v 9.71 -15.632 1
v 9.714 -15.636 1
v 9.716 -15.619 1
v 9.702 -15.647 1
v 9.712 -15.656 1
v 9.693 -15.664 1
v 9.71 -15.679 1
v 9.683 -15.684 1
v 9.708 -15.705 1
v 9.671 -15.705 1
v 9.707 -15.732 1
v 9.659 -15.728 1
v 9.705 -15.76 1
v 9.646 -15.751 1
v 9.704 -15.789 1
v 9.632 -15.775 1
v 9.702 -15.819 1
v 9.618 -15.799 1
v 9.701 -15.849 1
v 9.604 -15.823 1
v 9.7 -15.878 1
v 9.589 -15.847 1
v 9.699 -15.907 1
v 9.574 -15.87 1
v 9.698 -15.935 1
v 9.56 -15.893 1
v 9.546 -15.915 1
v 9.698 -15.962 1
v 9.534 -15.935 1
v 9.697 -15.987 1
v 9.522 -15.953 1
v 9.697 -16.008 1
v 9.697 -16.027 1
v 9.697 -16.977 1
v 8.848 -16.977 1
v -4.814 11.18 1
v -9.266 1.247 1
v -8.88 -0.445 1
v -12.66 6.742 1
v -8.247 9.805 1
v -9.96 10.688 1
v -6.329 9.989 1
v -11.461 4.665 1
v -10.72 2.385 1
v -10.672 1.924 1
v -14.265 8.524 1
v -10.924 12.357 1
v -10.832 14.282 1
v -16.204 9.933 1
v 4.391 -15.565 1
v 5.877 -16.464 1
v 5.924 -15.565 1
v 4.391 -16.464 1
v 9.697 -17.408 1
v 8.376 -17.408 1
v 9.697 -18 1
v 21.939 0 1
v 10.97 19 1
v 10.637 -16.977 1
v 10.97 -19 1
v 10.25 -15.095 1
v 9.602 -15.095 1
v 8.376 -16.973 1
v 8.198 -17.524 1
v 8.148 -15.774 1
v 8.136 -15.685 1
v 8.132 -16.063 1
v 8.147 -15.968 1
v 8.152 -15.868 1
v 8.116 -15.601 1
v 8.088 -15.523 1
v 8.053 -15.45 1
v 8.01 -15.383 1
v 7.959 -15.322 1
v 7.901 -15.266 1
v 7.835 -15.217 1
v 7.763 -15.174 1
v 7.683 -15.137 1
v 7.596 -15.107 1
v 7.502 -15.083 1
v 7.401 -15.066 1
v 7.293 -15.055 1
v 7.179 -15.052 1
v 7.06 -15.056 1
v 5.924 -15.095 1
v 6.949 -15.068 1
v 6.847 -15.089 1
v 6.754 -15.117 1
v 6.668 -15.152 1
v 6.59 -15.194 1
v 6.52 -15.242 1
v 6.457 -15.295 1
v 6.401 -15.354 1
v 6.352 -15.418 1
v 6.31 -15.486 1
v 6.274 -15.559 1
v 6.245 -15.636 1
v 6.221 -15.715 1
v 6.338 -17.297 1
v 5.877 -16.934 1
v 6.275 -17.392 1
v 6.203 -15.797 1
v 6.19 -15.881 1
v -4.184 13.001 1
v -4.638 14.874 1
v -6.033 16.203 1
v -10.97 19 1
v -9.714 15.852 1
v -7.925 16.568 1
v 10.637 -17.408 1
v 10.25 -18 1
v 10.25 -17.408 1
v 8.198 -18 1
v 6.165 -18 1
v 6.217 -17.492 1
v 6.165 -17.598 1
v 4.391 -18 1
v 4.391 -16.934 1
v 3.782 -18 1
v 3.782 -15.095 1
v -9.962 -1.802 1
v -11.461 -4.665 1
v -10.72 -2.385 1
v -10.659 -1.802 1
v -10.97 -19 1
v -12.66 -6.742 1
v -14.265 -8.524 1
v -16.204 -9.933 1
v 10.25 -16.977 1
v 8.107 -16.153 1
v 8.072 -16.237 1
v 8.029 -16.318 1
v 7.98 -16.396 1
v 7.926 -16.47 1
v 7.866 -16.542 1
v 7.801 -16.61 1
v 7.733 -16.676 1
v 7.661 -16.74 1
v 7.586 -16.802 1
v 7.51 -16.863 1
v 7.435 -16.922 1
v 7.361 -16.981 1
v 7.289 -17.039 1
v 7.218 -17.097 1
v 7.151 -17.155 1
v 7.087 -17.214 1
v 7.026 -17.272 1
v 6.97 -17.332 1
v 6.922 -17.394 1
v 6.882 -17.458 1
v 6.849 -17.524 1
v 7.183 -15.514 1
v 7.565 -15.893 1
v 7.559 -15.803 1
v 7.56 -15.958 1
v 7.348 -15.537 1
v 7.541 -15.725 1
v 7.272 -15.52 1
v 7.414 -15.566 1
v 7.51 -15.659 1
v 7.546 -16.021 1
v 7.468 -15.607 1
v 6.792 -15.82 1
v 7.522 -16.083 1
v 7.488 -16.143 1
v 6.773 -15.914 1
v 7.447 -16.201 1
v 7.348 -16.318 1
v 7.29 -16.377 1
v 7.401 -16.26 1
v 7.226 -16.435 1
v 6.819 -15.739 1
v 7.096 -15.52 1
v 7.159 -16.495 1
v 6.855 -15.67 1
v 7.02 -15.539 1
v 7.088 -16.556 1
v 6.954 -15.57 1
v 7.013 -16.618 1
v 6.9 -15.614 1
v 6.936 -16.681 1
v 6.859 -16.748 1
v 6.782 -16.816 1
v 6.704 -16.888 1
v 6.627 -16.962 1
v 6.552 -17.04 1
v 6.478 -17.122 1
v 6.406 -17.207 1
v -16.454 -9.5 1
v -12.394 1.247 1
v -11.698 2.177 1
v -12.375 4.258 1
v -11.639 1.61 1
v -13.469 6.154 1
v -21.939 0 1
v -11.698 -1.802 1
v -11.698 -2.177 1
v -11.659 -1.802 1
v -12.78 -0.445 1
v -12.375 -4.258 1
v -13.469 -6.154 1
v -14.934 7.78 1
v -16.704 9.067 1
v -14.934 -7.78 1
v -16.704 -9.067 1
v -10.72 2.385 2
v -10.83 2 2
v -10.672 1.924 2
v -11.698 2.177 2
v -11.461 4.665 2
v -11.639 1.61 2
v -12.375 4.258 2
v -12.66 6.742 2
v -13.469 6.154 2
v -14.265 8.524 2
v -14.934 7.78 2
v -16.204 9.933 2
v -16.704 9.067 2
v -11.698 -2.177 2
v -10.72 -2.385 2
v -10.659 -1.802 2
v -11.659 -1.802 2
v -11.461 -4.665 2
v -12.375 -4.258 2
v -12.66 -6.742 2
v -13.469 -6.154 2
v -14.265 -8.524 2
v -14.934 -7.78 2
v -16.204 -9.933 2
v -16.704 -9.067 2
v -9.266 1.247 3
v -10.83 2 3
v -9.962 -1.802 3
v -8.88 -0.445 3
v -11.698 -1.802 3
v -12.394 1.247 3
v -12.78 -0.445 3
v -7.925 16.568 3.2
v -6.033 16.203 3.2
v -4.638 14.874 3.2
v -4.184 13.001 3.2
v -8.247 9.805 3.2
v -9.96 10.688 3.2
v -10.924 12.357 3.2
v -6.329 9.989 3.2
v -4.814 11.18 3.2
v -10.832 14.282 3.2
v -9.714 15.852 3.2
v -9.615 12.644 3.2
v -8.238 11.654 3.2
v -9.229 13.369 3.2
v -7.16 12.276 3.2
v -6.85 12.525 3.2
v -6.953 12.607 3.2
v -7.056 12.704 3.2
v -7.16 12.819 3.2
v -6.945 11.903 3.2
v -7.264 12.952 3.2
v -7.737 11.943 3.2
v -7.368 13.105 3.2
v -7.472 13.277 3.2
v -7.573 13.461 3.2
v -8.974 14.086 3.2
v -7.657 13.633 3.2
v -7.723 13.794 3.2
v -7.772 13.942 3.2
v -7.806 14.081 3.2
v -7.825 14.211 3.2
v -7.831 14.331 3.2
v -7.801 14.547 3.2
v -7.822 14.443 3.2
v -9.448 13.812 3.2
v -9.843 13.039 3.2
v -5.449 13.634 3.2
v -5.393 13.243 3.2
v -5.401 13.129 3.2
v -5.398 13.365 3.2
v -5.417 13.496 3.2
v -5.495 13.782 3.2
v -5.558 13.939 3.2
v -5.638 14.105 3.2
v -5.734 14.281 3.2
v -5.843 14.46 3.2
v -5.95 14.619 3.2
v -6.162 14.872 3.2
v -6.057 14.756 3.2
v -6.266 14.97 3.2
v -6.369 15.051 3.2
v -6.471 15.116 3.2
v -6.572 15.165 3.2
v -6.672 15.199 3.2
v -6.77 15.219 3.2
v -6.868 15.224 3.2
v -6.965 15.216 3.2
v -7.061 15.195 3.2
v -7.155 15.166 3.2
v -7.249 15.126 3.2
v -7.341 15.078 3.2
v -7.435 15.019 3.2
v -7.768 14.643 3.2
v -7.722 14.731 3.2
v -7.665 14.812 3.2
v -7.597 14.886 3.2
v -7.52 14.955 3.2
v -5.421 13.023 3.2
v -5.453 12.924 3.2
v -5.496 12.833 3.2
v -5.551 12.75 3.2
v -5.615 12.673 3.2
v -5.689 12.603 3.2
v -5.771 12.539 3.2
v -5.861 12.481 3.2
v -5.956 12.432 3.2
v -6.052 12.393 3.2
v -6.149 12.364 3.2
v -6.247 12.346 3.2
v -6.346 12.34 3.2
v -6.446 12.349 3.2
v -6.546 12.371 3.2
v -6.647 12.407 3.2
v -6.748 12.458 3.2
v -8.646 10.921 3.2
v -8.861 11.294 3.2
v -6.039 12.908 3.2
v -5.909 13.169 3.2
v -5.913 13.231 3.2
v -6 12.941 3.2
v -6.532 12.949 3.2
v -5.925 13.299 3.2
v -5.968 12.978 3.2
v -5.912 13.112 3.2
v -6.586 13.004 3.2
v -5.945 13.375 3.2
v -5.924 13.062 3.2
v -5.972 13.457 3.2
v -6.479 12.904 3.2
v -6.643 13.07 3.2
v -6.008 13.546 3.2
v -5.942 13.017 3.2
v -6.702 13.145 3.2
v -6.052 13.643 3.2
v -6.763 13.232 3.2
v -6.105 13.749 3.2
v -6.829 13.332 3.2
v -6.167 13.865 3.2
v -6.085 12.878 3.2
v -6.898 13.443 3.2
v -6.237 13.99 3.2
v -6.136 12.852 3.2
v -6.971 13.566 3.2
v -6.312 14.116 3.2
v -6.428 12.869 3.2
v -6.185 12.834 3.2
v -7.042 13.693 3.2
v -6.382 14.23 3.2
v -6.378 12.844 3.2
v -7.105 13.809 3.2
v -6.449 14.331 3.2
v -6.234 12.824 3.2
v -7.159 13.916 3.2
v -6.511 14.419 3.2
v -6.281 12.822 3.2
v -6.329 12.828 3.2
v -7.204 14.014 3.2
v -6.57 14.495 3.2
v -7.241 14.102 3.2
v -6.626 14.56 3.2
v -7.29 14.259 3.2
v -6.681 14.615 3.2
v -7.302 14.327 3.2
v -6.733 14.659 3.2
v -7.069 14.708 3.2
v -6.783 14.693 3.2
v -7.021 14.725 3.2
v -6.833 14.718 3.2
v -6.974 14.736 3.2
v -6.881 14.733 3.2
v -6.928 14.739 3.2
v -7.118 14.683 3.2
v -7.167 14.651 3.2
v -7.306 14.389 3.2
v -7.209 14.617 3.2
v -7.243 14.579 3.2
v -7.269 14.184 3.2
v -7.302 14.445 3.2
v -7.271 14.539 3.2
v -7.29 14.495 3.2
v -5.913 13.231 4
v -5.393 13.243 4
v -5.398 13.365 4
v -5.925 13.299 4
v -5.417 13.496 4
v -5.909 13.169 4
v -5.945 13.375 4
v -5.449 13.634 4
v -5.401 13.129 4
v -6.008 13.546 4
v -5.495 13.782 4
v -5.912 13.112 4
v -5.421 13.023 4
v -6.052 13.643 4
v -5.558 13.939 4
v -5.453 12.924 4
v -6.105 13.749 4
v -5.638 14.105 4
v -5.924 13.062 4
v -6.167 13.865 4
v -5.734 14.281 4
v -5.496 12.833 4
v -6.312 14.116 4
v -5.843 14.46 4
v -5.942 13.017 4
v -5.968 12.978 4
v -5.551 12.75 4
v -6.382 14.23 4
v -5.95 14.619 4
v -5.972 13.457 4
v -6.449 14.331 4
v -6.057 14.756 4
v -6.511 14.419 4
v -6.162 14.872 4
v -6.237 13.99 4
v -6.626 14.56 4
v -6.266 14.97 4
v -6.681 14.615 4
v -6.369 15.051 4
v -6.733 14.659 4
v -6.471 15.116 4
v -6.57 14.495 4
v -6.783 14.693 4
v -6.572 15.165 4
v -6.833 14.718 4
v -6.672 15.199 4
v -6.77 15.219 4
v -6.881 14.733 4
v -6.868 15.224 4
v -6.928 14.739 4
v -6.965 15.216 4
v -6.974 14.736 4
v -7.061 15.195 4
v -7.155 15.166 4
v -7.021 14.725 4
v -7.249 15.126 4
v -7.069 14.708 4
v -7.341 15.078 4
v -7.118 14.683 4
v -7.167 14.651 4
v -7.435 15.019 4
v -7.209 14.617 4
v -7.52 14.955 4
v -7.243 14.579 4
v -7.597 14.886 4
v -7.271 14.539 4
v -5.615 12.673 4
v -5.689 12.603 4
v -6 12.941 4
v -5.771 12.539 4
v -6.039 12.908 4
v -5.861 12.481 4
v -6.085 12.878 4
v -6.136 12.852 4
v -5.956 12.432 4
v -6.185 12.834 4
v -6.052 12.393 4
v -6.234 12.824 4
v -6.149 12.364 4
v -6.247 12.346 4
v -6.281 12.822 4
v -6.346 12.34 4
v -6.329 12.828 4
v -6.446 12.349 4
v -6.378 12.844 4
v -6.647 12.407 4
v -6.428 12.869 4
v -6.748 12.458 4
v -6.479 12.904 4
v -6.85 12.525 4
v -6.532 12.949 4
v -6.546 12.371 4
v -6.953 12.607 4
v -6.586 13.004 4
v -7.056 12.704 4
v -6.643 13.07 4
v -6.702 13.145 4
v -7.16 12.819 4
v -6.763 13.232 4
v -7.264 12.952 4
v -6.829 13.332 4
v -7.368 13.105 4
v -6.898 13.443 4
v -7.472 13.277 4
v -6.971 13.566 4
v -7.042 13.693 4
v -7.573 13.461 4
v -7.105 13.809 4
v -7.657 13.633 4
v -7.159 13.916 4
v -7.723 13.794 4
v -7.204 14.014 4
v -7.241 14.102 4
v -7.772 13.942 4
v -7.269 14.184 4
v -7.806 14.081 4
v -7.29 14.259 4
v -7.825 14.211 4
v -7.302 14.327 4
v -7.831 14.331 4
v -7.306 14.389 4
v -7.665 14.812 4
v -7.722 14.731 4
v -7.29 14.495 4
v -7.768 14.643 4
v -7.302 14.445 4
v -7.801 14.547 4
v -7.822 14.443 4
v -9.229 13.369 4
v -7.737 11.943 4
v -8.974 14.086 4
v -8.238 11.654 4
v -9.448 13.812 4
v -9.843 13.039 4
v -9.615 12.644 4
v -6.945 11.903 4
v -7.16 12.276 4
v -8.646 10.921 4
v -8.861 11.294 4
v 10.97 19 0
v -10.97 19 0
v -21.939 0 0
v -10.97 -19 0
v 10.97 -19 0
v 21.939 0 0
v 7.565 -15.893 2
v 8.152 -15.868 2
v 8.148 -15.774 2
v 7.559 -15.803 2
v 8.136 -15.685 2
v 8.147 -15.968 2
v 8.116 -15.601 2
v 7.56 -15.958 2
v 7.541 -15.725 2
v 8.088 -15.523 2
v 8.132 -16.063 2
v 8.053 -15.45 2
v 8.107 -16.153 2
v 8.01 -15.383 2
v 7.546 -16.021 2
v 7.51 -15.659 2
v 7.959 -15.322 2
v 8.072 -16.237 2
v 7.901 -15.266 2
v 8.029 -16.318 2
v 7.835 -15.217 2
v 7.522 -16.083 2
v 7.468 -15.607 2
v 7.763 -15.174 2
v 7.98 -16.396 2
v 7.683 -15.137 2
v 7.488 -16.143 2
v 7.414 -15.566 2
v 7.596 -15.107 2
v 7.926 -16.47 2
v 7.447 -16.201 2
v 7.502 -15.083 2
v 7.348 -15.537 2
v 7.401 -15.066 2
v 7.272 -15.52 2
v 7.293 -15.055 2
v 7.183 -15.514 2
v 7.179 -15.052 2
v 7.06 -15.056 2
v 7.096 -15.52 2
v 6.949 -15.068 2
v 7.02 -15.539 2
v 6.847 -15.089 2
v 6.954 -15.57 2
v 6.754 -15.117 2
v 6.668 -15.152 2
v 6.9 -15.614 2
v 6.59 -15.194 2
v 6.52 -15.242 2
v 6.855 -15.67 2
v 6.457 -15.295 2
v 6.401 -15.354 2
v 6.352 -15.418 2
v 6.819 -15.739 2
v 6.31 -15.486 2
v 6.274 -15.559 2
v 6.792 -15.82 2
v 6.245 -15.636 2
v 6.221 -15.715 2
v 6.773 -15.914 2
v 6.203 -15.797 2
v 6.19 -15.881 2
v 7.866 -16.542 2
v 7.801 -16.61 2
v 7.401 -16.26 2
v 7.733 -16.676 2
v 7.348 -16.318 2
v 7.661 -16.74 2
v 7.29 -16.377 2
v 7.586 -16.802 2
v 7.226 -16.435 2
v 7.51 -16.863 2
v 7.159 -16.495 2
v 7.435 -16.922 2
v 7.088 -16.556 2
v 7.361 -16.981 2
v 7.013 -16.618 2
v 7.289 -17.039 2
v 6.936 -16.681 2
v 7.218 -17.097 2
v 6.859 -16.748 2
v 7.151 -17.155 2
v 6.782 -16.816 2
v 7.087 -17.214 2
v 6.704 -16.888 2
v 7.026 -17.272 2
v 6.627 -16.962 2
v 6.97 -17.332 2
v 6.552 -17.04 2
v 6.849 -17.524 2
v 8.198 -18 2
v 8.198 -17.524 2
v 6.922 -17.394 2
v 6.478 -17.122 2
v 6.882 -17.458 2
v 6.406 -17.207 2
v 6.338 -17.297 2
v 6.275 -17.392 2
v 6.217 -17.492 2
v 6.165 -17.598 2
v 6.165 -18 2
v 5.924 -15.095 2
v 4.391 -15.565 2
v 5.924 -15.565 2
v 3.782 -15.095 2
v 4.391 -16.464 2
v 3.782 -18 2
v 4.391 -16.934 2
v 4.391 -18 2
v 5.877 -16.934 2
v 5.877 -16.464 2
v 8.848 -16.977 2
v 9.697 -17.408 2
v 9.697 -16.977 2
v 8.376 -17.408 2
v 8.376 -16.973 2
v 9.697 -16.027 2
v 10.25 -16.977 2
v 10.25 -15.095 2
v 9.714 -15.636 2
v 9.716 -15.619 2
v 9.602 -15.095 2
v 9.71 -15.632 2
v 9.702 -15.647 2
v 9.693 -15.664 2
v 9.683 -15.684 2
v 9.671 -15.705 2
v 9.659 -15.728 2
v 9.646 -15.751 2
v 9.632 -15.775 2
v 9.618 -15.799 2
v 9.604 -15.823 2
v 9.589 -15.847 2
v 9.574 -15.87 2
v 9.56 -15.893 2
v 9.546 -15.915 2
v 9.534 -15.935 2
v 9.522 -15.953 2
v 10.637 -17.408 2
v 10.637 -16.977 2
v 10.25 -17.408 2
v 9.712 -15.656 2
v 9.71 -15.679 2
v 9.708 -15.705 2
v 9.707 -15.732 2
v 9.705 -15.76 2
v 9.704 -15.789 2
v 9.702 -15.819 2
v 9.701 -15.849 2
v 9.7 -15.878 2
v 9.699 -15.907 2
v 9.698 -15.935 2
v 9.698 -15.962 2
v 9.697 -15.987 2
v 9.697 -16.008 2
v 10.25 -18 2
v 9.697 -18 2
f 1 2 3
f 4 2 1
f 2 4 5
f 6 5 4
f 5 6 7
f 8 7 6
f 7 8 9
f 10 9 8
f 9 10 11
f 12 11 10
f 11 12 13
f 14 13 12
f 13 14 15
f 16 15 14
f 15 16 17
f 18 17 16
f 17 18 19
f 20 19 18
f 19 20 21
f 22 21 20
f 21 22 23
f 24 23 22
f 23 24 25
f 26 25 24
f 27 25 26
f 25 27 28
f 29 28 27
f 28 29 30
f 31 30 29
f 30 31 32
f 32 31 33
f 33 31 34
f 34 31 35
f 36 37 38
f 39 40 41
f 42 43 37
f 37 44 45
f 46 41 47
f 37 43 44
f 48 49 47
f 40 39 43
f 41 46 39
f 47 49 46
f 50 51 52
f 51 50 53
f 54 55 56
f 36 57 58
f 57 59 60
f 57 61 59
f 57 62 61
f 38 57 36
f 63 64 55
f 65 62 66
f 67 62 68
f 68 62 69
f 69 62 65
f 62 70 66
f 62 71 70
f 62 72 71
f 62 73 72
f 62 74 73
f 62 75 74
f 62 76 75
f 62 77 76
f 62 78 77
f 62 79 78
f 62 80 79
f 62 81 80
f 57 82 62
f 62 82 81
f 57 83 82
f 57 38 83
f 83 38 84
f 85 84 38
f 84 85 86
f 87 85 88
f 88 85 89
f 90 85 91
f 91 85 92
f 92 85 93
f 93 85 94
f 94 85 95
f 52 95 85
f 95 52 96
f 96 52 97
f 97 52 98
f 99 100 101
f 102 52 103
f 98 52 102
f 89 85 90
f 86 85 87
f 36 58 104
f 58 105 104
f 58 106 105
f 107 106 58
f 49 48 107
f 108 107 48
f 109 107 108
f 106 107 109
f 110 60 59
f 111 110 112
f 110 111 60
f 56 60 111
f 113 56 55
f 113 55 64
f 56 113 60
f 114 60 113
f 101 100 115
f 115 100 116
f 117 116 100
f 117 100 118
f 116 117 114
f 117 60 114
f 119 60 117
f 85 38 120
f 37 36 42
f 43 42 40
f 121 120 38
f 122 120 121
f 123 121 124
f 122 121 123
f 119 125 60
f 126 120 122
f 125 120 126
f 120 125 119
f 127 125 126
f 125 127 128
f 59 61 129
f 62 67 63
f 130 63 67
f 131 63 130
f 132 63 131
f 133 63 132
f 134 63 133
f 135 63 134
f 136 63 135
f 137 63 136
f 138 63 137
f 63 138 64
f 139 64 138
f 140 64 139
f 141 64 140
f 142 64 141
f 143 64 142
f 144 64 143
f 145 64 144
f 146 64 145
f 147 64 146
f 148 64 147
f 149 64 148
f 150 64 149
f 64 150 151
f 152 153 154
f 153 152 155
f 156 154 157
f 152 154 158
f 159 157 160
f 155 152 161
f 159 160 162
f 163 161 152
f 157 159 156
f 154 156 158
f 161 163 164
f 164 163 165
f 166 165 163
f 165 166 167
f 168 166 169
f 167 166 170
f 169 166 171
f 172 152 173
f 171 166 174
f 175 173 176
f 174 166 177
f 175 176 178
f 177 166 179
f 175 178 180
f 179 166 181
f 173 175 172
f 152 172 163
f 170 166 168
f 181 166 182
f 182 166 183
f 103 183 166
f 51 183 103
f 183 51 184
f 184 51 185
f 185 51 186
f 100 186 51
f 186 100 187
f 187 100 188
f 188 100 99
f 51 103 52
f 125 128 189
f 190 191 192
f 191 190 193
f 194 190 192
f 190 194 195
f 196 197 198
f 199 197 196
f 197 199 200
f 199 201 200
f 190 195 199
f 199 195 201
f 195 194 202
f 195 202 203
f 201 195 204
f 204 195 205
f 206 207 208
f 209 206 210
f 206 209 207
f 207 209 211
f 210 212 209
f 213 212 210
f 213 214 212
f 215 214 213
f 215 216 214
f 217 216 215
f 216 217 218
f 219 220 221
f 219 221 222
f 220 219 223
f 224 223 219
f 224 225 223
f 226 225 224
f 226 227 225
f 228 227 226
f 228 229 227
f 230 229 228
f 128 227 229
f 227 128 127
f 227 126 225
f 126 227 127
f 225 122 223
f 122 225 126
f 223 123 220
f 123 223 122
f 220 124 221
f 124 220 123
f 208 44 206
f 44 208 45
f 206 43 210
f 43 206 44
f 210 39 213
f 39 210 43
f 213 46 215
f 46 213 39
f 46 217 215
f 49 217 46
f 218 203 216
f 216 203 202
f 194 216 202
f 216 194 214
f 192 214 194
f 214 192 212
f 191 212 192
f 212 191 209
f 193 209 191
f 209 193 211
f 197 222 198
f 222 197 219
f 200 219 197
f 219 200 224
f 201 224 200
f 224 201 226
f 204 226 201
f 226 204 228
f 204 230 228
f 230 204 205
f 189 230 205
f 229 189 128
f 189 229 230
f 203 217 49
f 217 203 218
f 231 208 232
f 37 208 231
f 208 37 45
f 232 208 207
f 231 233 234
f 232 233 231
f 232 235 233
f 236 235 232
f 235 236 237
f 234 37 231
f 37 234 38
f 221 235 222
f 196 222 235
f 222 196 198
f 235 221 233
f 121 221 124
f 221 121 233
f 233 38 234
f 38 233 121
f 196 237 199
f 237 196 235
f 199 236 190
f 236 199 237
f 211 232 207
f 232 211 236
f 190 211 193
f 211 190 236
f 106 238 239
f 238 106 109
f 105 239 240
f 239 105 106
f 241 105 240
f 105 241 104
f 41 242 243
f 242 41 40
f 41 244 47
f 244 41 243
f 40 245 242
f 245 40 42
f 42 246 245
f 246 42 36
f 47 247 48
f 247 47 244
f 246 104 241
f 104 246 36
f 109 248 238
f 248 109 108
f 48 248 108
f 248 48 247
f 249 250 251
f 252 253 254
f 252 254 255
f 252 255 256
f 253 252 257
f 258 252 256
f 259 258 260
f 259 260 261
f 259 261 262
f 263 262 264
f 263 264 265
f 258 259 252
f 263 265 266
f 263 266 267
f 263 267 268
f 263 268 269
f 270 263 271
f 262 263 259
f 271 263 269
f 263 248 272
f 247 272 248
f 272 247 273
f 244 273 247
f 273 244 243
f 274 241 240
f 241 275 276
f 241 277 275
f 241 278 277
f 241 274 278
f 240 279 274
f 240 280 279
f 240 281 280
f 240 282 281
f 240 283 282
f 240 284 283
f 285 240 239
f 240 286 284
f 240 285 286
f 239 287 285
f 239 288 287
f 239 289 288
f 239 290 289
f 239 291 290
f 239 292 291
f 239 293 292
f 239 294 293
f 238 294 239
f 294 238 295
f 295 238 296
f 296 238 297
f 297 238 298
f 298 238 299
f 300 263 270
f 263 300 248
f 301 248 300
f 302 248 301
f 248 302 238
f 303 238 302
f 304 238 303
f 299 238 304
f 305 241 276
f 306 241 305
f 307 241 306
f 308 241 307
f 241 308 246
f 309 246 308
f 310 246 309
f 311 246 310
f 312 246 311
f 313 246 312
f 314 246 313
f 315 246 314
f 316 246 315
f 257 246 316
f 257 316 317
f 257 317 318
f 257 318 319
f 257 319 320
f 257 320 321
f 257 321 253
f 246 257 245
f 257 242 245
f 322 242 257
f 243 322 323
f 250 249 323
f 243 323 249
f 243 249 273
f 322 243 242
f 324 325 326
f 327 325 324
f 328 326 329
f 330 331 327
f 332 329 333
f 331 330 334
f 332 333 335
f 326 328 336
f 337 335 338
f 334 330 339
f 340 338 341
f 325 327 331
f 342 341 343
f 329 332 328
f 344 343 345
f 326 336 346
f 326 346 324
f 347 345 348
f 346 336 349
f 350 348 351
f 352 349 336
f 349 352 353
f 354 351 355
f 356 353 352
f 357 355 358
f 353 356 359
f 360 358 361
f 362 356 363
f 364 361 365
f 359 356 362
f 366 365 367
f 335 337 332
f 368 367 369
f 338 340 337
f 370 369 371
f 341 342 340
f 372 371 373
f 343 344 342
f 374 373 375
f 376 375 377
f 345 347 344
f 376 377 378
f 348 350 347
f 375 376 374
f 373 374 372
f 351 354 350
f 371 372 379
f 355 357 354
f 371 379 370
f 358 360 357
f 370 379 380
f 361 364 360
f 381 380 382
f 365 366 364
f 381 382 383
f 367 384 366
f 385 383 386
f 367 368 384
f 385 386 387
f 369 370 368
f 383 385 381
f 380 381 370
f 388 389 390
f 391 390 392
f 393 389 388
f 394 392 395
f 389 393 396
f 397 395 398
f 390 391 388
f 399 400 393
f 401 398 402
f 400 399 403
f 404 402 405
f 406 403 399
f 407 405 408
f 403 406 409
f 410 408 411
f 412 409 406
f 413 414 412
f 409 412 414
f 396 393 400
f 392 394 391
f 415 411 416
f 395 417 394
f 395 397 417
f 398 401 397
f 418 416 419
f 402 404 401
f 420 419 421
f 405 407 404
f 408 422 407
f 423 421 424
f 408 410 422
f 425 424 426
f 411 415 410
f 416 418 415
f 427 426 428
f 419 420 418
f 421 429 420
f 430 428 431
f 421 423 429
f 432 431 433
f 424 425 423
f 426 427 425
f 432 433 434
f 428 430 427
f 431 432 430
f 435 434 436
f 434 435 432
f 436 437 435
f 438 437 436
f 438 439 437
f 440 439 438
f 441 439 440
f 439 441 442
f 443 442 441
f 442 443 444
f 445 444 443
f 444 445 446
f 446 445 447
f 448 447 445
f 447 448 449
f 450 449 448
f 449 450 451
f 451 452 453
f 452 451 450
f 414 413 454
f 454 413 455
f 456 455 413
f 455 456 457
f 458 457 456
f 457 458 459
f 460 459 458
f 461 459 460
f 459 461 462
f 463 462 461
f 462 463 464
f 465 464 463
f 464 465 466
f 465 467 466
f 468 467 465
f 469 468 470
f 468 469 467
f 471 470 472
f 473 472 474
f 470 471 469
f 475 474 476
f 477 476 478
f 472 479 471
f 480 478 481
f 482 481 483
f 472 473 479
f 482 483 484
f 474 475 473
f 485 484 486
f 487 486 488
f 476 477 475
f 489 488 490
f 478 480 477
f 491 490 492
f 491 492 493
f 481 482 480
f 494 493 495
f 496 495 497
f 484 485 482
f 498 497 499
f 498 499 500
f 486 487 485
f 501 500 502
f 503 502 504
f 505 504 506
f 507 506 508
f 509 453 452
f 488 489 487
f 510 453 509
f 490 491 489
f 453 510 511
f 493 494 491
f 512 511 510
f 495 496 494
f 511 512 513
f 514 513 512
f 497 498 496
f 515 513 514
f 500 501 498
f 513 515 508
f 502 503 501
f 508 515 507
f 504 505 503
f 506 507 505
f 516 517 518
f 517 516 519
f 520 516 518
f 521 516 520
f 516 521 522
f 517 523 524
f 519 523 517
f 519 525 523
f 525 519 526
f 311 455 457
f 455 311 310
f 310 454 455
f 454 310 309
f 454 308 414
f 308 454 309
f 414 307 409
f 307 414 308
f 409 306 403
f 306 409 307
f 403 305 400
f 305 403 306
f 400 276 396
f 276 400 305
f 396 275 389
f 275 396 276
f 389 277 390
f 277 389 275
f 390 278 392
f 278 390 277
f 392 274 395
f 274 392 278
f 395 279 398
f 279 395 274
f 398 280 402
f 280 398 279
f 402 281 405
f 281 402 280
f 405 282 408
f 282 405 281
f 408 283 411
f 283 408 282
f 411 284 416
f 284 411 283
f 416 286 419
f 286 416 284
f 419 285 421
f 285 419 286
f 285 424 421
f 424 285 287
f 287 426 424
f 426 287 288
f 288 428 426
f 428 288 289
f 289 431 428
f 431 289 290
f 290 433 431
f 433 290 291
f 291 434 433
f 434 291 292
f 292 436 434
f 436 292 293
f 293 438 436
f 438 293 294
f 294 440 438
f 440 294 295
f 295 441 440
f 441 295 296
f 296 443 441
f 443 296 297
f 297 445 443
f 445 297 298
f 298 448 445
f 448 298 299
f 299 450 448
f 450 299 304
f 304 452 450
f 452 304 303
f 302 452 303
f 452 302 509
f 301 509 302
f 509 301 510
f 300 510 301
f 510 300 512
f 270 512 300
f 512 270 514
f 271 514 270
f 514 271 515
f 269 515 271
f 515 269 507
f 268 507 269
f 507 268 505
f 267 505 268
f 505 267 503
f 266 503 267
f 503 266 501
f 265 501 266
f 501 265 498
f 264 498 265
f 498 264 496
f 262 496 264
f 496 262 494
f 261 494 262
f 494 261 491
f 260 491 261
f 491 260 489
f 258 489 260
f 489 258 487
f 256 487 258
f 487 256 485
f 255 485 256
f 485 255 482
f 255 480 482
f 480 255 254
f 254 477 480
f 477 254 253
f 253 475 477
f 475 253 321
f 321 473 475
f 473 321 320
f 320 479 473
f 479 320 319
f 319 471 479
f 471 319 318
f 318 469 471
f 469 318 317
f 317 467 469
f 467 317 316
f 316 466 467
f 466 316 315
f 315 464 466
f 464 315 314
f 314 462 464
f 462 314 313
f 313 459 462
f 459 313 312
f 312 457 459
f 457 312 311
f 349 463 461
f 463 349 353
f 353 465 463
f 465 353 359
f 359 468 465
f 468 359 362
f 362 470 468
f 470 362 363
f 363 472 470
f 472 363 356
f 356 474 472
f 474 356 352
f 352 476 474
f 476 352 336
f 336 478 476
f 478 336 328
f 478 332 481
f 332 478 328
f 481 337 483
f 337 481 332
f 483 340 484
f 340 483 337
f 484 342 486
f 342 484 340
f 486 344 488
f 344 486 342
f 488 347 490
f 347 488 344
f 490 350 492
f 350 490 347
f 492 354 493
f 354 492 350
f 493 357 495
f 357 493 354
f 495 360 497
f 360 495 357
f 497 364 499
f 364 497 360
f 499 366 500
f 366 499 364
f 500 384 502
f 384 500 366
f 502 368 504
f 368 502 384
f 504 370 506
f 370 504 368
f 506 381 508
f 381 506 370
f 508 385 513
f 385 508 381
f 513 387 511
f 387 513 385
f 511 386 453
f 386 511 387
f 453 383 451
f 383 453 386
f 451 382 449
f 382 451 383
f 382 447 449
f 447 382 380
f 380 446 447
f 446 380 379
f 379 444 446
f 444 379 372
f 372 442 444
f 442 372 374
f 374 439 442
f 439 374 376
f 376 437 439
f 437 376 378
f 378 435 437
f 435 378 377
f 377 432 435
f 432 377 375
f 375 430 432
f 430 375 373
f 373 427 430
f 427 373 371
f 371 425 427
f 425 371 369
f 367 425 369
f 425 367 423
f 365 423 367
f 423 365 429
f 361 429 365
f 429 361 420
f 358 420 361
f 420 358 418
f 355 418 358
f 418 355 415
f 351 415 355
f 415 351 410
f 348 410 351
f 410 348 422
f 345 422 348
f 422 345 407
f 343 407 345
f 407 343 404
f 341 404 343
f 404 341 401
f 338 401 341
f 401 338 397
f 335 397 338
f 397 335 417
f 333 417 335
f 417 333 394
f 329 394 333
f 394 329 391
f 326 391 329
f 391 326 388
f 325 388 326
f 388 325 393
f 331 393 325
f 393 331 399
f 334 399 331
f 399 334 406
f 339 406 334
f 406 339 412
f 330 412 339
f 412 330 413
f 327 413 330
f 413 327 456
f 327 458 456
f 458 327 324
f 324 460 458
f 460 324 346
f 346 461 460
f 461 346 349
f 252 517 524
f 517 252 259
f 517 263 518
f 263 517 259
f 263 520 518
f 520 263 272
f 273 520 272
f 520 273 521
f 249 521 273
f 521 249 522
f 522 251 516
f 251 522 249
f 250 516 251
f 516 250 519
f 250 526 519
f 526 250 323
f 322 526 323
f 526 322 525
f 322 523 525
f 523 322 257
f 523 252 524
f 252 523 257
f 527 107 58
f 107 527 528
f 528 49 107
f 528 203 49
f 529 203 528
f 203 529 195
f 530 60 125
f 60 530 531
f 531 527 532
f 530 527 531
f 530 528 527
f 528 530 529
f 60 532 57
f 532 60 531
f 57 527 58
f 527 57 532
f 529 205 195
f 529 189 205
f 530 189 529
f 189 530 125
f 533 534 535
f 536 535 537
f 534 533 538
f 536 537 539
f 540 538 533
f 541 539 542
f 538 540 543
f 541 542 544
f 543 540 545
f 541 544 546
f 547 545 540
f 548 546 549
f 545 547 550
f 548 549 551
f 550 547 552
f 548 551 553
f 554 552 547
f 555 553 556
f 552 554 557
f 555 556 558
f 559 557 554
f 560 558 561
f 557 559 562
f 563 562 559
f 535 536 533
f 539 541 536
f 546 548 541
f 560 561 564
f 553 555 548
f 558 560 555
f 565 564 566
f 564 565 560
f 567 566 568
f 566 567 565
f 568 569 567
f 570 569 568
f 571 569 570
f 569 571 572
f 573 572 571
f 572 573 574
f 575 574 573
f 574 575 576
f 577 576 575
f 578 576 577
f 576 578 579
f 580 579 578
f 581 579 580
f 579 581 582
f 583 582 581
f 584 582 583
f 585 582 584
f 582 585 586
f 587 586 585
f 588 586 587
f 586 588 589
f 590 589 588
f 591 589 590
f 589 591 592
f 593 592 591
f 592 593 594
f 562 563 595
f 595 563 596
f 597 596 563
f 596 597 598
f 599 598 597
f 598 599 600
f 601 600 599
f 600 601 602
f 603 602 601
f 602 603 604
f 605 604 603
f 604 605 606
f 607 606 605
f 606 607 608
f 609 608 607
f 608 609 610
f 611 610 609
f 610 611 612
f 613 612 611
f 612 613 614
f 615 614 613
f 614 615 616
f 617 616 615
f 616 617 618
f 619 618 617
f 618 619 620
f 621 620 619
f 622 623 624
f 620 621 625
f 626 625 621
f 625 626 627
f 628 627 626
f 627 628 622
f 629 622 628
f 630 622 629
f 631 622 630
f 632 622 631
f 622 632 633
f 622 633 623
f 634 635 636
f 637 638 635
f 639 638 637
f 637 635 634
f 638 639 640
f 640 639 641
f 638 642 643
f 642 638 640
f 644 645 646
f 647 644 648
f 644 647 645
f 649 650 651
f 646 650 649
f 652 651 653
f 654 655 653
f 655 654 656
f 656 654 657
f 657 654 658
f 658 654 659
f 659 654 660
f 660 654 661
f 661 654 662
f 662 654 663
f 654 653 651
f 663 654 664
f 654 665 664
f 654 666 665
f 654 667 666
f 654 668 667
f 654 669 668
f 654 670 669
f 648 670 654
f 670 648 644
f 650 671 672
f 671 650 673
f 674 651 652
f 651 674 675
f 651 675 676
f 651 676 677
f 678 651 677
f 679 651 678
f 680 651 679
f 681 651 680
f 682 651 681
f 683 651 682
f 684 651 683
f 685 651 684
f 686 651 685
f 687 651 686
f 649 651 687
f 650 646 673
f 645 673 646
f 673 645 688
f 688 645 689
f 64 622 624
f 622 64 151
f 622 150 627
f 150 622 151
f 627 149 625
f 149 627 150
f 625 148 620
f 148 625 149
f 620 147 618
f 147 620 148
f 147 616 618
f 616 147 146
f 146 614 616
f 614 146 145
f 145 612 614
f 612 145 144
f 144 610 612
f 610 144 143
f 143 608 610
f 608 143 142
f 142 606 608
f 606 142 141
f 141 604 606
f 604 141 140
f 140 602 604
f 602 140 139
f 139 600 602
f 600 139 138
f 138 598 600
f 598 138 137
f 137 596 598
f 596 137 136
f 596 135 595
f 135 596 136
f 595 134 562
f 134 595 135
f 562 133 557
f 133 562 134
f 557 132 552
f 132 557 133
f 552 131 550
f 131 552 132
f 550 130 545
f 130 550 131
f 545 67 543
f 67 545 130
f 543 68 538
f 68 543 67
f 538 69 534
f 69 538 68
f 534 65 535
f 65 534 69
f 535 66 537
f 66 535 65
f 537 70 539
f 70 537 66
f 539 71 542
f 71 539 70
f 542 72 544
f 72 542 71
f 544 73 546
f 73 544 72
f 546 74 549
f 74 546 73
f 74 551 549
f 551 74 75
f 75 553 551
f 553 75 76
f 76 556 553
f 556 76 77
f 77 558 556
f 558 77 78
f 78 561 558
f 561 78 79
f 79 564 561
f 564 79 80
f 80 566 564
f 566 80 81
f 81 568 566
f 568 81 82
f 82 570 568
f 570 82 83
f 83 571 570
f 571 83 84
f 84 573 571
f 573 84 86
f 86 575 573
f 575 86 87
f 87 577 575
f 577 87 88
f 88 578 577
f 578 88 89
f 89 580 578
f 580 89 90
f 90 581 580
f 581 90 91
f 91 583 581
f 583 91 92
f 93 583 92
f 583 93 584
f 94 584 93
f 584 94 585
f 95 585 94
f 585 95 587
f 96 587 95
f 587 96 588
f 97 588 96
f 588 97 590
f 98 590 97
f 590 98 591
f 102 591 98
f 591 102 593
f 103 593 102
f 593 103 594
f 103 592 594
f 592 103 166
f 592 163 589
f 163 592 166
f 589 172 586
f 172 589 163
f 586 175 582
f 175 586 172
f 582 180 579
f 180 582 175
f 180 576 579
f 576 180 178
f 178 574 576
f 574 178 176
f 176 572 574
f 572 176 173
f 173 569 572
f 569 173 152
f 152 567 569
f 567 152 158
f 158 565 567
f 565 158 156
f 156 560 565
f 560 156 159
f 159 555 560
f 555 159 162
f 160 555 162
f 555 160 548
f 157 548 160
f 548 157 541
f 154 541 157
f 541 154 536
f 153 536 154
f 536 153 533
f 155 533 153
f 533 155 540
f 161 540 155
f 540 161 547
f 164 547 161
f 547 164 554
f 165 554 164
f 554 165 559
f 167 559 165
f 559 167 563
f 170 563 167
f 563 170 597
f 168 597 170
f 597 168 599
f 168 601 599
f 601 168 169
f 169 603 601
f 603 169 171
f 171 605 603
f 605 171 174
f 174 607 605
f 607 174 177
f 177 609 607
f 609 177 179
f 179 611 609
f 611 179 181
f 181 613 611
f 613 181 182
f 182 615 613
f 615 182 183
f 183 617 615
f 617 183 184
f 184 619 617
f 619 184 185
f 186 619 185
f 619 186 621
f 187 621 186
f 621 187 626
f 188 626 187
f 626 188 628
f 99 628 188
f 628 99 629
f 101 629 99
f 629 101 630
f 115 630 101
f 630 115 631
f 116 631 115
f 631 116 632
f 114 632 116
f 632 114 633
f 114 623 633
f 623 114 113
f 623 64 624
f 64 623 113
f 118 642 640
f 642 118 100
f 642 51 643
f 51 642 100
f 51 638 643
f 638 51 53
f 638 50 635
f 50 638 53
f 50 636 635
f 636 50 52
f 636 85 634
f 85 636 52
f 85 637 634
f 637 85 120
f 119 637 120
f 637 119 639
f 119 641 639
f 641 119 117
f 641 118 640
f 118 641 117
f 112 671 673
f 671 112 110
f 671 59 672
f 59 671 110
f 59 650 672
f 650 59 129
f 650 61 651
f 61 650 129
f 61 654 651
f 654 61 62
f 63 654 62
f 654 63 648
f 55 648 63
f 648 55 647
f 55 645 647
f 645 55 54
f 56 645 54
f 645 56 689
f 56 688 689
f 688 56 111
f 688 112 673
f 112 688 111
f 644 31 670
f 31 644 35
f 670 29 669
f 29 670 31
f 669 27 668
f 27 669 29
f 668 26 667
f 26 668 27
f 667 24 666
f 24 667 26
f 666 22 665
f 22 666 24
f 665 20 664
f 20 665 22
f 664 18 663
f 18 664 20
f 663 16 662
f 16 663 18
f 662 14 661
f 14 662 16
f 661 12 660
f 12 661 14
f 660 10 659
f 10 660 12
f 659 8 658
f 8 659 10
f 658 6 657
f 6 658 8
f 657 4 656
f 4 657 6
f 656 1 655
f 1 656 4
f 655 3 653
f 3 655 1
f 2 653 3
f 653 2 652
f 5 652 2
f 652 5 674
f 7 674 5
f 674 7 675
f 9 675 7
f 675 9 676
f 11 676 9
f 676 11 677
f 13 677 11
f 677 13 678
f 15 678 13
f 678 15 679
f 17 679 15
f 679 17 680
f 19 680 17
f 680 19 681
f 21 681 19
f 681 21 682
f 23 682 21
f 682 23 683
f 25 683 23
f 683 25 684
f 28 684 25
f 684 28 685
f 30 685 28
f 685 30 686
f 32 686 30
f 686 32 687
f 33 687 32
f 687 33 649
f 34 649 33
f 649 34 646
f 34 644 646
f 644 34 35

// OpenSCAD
include <../../Scripts/18xx tiles basic functions.scad>
hex("Blue");
small_town_sharp_curve(4);
put_tilenr("F24");
put_value_blue("10",-30);
